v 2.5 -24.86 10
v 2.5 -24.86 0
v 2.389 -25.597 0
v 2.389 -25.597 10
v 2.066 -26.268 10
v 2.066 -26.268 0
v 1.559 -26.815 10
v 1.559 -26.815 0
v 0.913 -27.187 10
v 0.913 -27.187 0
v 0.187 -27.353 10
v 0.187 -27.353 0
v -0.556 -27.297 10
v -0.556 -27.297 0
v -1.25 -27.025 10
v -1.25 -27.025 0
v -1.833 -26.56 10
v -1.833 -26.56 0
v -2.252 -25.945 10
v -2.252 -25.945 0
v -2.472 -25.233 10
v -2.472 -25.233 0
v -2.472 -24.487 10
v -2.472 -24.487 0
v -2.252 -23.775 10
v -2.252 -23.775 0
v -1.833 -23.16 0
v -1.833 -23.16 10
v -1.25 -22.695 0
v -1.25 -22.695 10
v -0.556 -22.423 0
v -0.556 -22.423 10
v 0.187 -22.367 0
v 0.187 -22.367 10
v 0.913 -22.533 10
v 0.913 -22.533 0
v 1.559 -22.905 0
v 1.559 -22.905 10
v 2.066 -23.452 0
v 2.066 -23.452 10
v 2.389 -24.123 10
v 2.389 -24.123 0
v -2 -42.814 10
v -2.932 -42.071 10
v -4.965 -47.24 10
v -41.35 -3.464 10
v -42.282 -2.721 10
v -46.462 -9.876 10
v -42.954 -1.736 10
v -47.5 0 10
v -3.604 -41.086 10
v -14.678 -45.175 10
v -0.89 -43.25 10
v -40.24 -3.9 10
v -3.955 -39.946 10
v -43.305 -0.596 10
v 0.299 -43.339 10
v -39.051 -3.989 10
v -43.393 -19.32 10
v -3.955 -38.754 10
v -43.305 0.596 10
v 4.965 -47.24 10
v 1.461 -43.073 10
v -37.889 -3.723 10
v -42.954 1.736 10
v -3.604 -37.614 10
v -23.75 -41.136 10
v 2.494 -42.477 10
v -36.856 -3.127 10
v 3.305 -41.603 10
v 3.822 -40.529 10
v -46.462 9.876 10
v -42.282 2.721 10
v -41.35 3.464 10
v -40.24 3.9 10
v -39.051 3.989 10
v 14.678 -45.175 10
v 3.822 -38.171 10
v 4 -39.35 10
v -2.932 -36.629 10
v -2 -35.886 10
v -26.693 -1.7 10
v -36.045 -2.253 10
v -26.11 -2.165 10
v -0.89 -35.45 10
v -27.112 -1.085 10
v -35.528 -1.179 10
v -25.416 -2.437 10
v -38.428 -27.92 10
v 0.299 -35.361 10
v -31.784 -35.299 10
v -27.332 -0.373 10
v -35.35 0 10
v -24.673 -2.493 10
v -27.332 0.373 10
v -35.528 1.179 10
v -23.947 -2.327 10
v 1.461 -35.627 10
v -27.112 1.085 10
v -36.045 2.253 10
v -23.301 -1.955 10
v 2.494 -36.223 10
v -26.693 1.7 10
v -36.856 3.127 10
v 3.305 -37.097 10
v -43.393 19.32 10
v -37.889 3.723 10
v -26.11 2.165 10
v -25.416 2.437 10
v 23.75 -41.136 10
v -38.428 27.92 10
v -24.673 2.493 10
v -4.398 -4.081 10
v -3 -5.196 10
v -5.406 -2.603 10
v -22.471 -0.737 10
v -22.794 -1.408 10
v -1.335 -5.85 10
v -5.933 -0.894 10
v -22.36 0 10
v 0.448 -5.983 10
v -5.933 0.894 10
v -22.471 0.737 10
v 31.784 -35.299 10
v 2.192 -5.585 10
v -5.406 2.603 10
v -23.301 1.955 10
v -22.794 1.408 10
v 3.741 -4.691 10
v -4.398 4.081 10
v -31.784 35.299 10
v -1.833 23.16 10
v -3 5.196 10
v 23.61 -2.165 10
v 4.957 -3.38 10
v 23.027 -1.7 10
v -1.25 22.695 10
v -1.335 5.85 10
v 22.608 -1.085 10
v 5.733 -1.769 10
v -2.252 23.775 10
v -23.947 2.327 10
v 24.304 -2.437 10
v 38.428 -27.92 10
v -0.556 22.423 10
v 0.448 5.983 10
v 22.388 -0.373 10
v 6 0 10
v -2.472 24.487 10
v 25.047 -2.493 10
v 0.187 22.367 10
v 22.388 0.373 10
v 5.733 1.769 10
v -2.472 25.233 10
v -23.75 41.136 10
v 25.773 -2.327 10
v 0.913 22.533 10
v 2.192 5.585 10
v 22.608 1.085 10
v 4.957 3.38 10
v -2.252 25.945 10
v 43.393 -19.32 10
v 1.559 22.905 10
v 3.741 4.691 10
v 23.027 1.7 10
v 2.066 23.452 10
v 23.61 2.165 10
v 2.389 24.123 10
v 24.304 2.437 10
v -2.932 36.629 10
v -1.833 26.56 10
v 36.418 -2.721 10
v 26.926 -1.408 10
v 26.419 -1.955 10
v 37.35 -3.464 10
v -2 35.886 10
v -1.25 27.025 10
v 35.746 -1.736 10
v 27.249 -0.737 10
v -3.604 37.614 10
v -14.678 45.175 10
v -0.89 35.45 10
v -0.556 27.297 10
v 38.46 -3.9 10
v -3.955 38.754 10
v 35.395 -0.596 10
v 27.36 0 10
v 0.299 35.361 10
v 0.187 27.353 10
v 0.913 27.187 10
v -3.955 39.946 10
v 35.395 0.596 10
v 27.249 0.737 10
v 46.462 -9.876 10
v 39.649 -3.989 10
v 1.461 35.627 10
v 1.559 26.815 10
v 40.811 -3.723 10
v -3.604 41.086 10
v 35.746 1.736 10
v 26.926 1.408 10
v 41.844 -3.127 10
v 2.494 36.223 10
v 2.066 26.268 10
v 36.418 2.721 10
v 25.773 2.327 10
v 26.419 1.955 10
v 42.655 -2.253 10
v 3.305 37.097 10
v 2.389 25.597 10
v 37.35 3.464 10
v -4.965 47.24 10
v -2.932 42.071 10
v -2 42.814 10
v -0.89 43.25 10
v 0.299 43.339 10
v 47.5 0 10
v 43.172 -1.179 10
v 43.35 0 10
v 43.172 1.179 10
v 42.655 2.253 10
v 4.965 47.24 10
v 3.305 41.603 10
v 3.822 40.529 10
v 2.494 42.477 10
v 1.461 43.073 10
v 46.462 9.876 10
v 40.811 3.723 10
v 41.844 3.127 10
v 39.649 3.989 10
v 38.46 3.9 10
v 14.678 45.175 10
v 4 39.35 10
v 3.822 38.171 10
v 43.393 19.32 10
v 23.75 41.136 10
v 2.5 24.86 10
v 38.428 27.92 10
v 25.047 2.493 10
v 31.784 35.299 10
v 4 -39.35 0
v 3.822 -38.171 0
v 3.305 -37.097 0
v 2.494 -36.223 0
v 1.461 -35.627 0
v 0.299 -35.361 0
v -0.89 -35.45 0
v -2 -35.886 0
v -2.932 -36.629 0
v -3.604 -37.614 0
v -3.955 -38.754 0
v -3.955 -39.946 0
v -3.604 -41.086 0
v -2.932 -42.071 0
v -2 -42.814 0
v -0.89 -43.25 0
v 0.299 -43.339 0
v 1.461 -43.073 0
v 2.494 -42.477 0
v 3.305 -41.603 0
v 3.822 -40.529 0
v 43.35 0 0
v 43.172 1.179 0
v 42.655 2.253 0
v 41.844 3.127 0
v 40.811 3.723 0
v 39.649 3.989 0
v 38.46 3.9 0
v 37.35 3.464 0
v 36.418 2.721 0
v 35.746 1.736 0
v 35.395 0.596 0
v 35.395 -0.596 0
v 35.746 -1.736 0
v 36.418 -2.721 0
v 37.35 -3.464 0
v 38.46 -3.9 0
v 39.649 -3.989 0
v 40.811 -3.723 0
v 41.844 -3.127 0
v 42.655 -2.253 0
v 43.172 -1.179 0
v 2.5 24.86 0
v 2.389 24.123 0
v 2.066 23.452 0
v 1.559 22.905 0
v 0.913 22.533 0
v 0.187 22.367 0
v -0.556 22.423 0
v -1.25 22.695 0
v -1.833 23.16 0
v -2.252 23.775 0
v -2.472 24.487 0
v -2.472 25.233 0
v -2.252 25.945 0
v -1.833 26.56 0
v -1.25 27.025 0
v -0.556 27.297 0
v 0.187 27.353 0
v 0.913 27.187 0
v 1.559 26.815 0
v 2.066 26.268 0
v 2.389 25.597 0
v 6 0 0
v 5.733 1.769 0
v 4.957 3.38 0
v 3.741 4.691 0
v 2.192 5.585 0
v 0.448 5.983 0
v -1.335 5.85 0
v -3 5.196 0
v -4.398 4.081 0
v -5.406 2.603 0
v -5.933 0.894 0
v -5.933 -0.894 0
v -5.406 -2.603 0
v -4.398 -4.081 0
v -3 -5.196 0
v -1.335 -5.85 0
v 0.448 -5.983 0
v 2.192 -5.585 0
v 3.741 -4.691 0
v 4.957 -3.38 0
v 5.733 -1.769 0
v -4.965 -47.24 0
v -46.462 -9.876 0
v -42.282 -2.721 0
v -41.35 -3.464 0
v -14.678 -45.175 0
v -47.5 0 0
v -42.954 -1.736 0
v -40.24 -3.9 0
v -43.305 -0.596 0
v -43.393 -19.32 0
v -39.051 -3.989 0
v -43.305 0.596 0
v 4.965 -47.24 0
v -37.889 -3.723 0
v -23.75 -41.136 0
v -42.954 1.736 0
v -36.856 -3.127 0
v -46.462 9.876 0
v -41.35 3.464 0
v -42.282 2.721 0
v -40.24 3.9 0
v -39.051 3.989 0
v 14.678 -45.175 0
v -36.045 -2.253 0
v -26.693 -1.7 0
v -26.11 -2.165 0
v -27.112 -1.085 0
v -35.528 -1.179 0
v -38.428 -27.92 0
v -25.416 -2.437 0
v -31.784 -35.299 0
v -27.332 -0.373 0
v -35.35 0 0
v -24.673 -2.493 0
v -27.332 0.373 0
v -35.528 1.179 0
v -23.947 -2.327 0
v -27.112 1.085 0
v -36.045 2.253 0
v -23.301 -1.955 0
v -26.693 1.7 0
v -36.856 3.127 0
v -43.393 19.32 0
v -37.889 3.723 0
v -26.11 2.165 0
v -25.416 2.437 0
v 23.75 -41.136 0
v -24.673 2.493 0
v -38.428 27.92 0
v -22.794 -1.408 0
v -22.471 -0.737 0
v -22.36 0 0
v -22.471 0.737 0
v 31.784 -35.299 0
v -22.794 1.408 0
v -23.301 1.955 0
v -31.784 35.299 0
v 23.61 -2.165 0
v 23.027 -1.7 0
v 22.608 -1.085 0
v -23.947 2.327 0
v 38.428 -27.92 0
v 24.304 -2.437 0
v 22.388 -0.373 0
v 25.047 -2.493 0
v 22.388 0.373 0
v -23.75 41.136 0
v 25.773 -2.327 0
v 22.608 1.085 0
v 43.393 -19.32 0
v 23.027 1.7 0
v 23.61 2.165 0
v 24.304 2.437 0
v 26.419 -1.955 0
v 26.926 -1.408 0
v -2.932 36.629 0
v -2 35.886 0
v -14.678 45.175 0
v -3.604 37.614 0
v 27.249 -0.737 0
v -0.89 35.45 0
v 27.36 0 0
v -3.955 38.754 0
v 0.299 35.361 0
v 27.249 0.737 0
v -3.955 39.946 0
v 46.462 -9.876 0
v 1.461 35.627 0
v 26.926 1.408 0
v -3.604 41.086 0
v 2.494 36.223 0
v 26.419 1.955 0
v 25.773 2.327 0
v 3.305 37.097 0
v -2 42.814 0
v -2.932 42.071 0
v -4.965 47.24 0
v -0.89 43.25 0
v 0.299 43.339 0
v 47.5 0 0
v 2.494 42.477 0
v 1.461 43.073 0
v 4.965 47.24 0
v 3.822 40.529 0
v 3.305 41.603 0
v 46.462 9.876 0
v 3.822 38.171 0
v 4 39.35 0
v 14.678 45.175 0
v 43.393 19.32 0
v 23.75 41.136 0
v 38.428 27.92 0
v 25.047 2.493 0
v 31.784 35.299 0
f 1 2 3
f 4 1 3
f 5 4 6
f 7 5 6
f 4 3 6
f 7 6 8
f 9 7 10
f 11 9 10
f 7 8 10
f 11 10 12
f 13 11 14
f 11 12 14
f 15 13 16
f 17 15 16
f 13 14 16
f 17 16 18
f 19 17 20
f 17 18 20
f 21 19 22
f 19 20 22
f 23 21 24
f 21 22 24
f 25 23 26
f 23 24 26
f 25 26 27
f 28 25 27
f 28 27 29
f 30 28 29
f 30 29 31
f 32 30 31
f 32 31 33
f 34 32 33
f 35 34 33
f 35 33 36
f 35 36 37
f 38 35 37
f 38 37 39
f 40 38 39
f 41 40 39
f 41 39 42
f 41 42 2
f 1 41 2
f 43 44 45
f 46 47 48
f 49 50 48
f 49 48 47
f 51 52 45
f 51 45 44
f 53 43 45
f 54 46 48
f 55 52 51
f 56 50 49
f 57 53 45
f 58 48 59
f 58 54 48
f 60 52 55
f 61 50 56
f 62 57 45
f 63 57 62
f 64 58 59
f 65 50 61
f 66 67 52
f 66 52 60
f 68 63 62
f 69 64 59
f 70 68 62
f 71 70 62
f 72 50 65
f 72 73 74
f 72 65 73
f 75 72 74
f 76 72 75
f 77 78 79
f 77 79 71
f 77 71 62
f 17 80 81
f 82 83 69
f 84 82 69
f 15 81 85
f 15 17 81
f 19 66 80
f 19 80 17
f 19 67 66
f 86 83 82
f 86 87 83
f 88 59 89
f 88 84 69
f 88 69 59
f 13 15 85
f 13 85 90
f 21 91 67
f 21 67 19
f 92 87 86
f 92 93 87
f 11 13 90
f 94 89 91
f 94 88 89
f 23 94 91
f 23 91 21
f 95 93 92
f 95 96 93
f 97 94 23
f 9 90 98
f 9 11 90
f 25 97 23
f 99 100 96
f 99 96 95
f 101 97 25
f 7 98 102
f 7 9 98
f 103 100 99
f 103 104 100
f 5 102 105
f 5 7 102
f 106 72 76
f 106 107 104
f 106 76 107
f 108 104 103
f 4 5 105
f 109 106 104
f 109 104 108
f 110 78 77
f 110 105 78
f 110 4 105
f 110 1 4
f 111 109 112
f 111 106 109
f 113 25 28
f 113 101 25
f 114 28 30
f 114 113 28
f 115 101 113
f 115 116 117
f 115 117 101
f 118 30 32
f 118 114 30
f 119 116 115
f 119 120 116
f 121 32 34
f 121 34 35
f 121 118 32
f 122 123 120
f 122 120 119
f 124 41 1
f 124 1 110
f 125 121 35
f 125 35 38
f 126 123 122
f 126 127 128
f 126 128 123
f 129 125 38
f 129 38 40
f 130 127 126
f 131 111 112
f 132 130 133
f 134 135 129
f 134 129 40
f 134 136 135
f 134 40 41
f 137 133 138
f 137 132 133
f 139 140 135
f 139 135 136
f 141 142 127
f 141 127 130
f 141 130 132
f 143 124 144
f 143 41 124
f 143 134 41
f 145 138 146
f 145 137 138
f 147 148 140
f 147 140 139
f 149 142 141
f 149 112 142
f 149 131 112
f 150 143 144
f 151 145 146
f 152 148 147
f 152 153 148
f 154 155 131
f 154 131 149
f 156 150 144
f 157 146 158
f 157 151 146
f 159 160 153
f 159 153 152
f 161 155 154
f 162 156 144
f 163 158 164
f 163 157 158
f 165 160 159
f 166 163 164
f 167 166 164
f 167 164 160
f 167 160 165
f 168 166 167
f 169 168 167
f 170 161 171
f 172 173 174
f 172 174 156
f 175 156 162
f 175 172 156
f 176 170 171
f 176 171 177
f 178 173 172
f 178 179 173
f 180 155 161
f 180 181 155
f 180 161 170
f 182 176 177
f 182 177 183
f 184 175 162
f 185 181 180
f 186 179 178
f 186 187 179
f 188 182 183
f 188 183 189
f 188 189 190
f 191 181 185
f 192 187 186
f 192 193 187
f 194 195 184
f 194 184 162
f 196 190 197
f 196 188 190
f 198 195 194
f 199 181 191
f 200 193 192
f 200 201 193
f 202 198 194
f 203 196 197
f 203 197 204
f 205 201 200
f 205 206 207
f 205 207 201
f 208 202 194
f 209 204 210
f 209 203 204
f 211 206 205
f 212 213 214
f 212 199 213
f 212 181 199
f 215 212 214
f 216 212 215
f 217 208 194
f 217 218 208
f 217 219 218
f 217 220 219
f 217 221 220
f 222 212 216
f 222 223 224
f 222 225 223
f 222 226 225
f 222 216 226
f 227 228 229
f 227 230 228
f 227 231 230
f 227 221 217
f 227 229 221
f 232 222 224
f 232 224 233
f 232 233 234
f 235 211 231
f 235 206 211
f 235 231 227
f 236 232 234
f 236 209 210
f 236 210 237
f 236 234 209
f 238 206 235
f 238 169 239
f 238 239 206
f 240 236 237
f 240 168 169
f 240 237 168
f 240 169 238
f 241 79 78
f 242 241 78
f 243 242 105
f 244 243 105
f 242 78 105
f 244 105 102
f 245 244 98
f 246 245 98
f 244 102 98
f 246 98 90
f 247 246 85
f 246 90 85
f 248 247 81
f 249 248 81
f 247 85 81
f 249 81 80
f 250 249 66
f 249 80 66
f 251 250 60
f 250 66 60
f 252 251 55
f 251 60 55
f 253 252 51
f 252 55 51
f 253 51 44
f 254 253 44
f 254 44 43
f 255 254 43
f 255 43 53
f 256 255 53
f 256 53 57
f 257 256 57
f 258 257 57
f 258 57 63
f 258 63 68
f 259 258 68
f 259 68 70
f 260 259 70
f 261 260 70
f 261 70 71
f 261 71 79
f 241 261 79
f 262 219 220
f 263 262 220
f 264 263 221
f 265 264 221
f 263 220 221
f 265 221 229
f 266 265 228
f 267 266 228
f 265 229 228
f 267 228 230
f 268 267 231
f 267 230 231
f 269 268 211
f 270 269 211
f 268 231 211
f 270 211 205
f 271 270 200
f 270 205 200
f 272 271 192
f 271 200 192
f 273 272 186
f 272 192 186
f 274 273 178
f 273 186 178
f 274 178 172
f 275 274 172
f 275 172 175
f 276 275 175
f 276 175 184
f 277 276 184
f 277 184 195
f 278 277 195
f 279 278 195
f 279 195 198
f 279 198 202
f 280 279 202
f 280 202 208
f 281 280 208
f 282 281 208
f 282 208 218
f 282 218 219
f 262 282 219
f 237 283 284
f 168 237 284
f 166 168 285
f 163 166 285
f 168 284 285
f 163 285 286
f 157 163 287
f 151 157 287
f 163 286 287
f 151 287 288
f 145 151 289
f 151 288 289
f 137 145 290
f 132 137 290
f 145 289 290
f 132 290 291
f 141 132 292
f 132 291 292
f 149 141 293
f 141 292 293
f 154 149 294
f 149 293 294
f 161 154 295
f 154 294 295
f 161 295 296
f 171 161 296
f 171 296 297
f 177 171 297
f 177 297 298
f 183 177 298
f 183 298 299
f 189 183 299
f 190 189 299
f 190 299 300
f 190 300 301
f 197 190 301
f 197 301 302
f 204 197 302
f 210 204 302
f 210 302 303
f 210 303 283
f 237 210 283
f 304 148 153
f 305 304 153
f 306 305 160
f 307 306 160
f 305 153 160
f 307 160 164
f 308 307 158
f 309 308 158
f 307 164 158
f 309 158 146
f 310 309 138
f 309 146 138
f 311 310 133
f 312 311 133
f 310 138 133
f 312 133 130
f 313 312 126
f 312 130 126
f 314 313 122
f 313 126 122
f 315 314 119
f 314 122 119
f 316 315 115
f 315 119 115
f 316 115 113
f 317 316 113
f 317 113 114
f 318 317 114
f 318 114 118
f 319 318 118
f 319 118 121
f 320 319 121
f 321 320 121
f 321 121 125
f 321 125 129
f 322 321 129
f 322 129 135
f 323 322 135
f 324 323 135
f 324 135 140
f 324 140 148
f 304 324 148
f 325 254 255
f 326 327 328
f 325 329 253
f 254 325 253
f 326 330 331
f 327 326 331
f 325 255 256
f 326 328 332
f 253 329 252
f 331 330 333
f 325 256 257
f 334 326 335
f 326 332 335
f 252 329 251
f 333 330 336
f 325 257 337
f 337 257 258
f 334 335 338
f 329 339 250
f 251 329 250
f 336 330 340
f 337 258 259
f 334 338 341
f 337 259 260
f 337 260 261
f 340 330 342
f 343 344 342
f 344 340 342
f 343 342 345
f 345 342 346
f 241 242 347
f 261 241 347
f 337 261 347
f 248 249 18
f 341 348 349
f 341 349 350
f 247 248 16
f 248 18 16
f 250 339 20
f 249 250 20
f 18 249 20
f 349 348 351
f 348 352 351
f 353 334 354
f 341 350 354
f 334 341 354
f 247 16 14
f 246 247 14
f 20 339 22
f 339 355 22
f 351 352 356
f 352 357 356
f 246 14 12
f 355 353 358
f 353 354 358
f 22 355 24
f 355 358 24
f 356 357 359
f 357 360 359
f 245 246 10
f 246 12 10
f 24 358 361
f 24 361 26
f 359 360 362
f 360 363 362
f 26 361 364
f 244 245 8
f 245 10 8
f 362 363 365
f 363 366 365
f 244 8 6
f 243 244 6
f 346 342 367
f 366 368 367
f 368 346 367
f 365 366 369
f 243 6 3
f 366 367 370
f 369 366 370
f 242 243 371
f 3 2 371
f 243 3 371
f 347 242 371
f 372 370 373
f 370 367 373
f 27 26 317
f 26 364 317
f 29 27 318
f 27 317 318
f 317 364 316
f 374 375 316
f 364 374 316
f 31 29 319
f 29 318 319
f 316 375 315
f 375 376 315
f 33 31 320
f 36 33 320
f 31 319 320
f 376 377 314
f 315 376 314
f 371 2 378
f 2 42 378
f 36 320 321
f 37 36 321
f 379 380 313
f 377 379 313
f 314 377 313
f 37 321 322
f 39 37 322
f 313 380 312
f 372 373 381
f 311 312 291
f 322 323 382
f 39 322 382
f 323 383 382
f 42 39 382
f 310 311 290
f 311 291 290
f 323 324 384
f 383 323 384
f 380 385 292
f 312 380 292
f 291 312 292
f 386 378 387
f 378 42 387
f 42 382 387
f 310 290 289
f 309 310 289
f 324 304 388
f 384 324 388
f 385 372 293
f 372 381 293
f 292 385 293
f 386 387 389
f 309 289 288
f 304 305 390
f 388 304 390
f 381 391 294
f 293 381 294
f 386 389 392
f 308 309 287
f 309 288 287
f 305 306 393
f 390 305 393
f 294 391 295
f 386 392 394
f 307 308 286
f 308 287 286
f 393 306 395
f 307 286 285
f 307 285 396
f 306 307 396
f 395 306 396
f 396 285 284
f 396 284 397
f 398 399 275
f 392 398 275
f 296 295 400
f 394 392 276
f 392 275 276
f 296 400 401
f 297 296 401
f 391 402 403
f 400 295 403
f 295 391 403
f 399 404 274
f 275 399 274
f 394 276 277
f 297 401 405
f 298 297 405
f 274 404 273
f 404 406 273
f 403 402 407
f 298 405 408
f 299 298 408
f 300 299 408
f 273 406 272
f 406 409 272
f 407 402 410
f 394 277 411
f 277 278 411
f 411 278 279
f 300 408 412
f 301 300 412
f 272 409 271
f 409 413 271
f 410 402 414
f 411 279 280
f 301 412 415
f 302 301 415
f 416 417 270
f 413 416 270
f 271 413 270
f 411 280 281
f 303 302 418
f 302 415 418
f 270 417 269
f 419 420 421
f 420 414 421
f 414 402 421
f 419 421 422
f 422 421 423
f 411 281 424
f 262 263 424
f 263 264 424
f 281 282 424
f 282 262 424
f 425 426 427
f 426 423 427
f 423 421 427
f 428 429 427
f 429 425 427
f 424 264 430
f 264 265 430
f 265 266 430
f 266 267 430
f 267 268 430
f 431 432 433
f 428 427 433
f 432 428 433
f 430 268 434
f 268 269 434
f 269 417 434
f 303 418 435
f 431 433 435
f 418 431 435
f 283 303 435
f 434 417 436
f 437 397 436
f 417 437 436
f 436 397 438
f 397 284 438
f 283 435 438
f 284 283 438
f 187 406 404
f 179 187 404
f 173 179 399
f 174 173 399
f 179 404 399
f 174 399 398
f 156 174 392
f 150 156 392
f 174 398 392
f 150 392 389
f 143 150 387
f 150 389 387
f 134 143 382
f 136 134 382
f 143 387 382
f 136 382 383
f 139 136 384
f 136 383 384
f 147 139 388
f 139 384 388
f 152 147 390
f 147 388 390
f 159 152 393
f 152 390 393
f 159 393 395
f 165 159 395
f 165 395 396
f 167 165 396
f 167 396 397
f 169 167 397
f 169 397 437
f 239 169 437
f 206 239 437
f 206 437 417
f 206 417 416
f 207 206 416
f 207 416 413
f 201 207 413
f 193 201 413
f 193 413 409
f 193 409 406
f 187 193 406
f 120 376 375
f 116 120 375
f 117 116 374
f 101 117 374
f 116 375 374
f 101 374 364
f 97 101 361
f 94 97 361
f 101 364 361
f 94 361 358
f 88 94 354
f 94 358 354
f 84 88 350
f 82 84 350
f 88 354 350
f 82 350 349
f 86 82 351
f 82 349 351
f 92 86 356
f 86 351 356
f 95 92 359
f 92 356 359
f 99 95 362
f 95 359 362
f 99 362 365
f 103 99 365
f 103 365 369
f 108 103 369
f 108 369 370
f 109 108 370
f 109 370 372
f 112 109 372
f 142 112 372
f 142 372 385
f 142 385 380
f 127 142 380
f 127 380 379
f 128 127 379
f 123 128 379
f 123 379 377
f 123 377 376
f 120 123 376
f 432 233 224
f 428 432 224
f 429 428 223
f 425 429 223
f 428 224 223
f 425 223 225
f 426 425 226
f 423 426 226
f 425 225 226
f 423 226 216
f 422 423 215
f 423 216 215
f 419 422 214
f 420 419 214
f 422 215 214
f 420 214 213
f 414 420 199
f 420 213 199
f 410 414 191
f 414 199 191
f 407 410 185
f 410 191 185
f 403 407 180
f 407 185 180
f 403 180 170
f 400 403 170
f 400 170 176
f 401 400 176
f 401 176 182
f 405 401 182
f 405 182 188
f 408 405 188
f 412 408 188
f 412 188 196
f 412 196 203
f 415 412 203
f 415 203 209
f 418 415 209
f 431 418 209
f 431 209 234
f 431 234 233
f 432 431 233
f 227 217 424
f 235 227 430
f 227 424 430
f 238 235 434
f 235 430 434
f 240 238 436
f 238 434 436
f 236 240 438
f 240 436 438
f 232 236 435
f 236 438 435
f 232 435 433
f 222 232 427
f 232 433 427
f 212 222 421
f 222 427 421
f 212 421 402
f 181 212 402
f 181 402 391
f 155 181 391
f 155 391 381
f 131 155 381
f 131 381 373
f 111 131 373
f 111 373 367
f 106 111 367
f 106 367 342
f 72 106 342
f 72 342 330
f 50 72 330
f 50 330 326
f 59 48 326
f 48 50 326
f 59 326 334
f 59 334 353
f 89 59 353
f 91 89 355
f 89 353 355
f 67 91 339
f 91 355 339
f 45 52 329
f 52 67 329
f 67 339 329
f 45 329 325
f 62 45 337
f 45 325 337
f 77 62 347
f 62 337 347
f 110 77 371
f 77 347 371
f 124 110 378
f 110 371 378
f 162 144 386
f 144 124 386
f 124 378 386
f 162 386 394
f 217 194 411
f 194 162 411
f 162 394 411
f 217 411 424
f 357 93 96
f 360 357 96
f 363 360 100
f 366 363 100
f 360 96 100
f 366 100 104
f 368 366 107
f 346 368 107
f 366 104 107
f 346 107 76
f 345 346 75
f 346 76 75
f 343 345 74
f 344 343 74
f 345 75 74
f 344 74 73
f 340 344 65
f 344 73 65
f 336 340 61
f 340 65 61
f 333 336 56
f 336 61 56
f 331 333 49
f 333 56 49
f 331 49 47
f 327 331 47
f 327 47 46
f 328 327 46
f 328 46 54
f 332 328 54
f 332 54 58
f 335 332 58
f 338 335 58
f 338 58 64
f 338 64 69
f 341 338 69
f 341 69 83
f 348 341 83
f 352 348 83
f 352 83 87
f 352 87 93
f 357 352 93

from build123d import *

# Parameters (mm, degrees)
F0_R      = 47.5
F1_DEPTH  = 45
F2_W      = 40.64
F2_H      = 40.64
F3_DEPTH  = 35
F4_R      = 6
F6_DEPTH  = 10.001
F7_W      = 7.9080420285
F7_H      = 7.9080420285
F8_DEPTH  = 35
F9_R      = 4
F10_DEPTH = 10.001
F11_DEPTH = 35
F12_R     = 2.5
F13_DEPTH = 10.001


with BuildPart() as f1:
    # F0 (on Top) → F1 (new body)
    with BuildSketch(Plane.XY):
        Circle(F0_R)
    extrude(amount=F1_DEPTH)

    # F2 (on face) → F3 (cut)
    with BuildSketch(Plane.XY.offset(45)):
        Rectangle(F2_W, F2_H)
    extrude(amount=-F3_DEPTH, mode=Mode.SUBTRACT)

    # F4 (on face) → F6 (cut, through all)
    with BuildSketch(Plane.XY.offset(10)):
        Circle(F4_R)
    extrude(amount=-F6_DEPTH, mode=Mode.SUBTRACT)

    # F7 (on face) → F8 (cut)
    with BuildSketch(Plane.XY.offset(45)):
        Polygon((37.3080420285, 37.3080420285), (37.3080420285, 29.4), (29.4, 29.4), (29.4, -29.4), (37.3080420285, -29.4), (37.3080420285, -37.3080420285), (49.4, -37.3080420285), (49.4, 37.3080420285), align=None)
        with Locations((33.3540210142, 33.3540210142)):
            Rectangle(F7_W, F7_H)
        Polygon((-29.4, 29.4), (29.4, 29.4), (29.4, 37.3080420285), (37.3080420285, 37.3080420285), (37.3080420285, 49.4), (-37.3080420285, 49.4), (-37.3080420285, 37.3080420285), (-29.4, 37.3080420285), align=None)
        Polygon((-29.4, -29.4), (-29.4, 29.4), (-37.3080420285, 29.4), (-37.3080420285, 37.3080420285), (-49.4, 37.3080420285), (-49.4, -37.3080420285), (-37.3080420285, -37.3080420285), (-37.3080420285, -29.4), align=None)
        with Locations((-33.3540210142, 33.3540210142)):
            Rectangle(F7_W, F7_H)
        Polygon((29.4, -37.3080420285), (29.4, -29.4), (-29.4, -29.4), (-29.4, -37.3080420285), (-37.3080420285, -37.3080420285), (-37.3080420285, -49.4), (37.3080420285, -49.4), (37.3080420285, -37.3080420285), align=None)
        with Locations((33.3540210142, -33.3540210142)):
            Rectangle(F7_W, F7_H)
        with Locations((-33.3540210142, -33.3540210142)):
            Rectangle(F7_W, F7_H)
    extrude(amount=-F8_DEPTH, mode=Mode.SUBTRACT)

    # F9 (on face) → F10 (cut, through all)
    with BuildSketch(Plane.XY.offset(10)):
        with Locations((0, 39.35)):
            Circle(F9_R)
        with Locations((39.35, 0)):
            Circle(F9_R)
        with Locations((0, -39.35)):
            Circle(F9_R)
        with Locations((-39.35, 0)):
            Circle(F9_R)
    extrude(amount=-F10_DEPTH, mode=Mode.SUBTRACT)

    # F11 (cut): a face of the model
    f11_faces = [f1.faces().sort_by_distance(p)[0] for p in [
        (0, -28.5684424253, 45),
    ]]
    extrude(f11_faces, amount=-F11_DEPTH, mode=Mode.SUBTRACT)

    # F12 (on face) → F13 (cut, through all)
    with BuildSketch(Plane(origin=(0, 0, 0), x_dir=(1, 0, 0), z_dir=(0, 0, -1))):
        with Locations((0, 24.86)):
            Circle(F12_R)
        with Locations((24.86, 0)):
            Circle(F12_R)
        with Locations((0, -24.86)):
            Circle(F12_R)
        with Locations((-24.86, 0)):
            Circle(F12_R)
    extrude(amount=-F13_DEPTH, mode=Mode.SUBTRACT)


solid = f1.part
